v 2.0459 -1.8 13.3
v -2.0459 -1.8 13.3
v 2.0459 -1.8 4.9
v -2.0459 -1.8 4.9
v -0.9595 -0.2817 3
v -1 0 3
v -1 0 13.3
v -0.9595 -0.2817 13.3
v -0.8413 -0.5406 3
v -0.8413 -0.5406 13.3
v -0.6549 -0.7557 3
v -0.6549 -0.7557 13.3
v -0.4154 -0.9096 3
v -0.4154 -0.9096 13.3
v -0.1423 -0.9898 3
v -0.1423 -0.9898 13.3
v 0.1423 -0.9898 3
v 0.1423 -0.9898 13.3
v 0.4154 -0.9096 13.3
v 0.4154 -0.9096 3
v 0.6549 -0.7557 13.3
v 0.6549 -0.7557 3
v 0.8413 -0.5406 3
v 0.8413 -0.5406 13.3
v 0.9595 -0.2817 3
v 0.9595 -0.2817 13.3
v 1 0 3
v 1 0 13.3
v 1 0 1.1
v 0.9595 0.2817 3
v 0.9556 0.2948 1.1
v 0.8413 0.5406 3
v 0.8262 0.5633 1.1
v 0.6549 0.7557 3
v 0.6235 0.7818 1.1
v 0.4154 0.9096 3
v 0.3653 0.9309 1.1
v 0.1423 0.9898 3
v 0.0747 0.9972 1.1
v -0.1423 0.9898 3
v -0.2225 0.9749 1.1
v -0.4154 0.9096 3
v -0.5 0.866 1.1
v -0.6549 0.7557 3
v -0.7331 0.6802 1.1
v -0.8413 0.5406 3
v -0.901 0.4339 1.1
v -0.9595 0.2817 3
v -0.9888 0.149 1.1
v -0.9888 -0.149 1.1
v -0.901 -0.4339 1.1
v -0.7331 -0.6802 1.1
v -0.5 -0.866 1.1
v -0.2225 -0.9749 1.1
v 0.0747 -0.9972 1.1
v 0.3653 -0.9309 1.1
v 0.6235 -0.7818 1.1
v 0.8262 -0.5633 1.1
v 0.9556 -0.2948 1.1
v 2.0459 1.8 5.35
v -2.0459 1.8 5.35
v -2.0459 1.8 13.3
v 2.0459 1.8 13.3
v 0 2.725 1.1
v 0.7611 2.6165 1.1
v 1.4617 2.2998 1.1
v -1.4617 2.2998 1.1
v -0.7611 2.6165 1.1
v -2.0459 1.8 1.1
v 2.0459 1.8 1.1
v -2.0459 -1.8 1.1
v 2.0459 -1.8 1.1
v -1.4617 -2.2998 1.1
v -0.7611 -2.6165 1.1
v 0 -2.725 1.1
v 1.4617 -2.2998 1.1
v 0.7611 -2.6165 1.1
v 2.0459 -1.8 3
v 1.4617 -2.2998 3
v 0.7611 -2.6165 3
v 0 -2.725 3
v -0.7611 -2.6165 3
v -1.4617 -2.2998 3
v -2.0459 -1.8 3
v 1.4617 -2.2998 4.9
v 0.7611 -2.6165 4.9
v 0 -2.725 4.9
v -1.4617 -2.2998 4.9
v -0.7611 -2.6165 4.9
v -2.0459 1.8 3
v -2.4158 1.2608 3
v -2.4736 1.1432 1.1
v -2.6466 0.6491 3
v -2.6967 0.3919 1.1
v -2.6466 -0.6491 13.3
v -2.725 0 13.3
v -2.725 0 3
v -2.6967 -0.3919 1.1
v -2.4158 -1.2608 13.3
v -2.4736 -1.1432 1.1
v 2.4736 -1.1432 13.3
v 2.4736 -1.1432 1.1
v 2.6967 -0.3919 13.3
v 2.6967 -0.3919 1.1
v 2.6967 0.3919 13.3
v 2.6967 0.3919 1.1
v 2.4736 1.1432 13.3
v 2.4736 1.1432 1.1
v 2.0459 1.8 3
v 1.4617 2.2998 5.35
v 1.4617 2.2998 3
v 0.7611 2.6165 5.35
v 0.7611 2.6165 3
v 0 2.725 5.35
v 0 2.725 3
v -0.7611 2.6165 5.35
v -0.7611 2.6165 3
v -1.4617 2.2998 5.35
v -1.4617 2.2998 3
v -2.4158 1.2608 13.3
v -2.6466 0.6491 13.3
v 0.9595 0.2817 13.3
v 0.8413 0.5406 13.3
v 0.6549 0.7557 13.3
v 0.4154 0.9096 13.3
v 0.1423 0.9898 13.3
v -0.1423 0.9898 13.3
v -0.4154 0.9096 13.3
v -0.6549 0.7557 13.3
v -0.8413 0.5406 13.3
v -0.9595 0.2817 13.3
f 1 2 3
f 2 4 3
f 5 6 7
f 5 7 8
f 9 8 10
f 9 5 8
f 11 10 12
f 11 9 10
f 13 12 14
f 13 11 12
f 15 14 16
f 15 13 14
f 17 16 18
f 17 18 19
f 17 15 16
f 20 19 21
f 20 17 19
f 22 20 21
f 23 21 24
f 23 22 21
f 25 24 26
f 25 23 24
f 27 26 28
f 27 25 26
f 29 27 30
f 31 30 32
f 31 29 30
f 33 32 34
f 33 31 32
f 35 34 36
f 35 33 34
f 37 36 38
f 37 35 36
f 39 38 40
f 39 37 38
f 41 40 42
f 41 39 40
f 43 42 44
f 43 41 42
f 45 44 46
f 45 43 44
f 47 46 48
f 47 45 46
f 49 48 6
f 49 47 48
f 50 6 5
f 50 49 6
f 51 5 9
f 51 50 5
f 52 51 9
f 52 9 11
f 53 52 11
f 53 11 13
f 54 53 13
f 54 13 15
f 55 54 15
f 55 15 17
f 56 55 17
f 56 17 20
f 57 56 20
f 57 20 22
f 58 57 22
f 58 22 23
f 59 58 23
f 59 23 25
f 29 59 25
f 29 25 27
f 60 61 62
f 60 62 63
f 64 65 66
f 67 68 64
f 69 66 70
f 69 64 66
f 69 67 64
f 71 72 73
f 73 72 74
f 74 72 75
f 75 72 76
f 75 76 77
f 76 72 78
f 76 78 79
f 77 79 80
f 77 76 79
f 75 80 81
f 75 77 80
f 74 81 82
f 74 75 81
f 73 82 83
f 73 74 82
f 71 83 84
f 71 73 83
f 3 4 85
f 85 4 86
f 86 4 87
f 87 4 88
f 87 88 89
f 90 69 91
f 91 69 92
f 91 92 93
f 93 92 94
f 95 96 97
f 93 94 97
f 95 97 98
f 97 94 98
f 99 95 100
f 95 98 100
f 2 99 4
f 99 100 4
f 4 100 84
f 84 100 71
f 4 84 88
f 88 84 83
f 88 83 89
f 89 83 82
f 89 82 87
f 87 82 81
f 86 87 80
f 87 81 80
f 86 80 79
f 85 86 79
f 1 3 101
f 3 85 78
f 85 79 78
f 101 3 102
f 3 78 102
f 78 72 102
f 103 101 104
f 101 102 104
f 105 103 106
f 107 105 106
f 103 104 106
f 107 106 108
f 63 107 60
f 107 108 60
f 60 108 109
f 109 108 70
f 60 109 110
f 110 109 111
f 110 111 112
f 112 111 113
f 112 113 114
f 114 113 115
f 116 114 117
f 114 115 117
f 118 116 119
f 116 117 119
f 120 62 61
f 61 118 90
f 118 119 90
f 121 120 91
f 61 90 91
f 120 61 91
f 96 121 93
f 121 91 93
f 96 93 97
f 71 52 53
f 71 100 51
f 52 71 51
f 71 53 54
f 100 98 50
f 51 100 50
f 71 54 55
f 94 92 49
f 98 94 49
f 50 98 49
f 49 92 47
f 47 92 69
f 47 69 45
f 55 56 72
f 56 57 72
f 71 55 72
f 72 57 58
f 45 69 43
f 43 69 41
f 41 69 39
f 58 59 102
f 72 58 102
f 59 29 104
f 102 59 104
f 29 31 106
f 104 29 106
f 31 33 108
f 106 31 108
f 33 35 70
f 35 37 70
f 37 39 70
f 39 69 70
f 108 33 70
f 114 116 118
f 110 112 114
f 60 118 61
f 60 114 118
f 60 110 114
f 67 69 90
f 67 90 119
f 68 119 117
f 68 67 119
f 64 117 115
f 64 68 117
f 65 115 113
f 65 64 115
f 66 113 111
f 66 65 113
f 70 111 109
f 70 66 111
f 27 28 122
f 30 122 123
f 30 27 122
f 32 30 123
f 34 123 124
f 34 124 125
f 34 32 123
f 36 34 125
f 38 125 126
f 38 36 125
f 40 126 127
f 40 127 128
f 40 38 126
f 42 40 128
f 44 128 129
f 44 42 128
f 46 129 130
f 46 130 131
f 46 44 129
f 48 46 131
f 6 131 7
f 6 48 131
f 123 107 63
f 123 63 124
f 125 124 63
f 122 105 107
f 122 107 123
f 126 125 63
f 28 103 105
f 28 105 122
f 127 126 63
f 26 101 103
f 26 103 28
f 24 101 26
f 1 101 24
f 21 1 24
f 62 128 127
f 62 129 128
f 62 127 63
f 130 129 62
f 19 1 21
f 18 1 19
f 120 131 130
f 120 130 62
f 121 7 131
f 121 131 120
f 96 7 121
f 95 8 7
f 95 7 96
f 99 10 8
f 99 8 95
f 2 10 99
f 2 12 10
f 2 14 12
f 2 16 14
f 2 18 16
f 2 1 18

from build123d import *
from build123d.topology import SkipClean

# Parameters (mm, degrees)
SKETCH1_R           = 1
BOSS_EXTRUDE1_DEPTH = 3
BOSS_EXTRUDE2_START = 0.5
SKETCH2_R           = 1.75
SKETCH2_R_2         = 1
BOSS_EXTRUDE2_DEPTH = 0.5
SKETCH3_R           = 2.725
SKETCH3_R_2         = 1
BOSS_EXTRUDE3_DEPTH = 10.3
CUT_EXTRUDE1_START  = -7.95
CUT_EXTRUDE1_DEPTH  = 7.95
CUT_EXTRUDE3_DEPTH  = 3.5
CUT_EXTRUDE4_START  = -8.4
CUT_EXTRUDE4_DEPTH  = 8.4
BOSS_EXTRUDE4_START = -12.2
SKETCH9_R           = 1
BOSS_EXTRUDE4_DEPTH = 12.2
BOSS_EXTRUDE5_START = 1.9
BOSS_EXTRUDE5_DEPTH = 1.9


with BuildPart() as part:
    # Sketch1 → Boss-Extrude1 (new body)
    with BuildSketch(Plane.XY):
        with BuildLine():
            Line((1.642723432, 9.052152215), (1.930369102, 8.457499638))
            Line((1.930369102, 8.457499638), (1.813545612, 7.945662484))
            ThreePointArc((1.813545612, 7.945662484), (1.99137431, 7.902969591), (2.168200291, 7.856297315))
            ThreePointArc((2.168200291, 7.856297315), (2.343934519, 7.805669156), (2.518488504, 7.751110608))
            Line((2.518488504, 7.751110608), (2.680722426, 8.250415279))
            Line((2.680722426, 8.250415279), (3.232648382, 8.61336081))
            Line((3.232648382, 8.61336081), (3.409492149, 7.976903427))
            Line((3.409492149, 7.976903427), (3.203154008, 7.494151346))
            ThreePointArc((3.203154008, 7.494151346), (3.370501815, 7.420392005), (3.536152474, 7.342896273))
            ThreePointArc((3.536152474, 7.342896273), (3.700022573, 7.261703172), (3.862029599, 7.176853585))
            Line((3.862029599, 7.176853585), (4.110810647, 7.639166239))
            Line((4.110810647, 7.639166239), (4.718673352, 7.897728901))
            Line((4.718673352, 7.897728901), (4.779031314, 7.239922976))
            Line((4.779031314, 7.239922976), (4.489810399, 6.801772018))
            ThreePointArc((4.489810399, 6.801772018), (4.641298619, 6.699316915), (4.790449806, 6.593488504))
            ThreePointArc((4.790449806, 6.593488504), (4.937188857, 6.484340073), (5.081441885, 6.371926582))
            Line((5.081441885, 6.371926582), (5.408774031, 6.78238811))
            Line((5.408774031, 6.78238811), (6.053036279, 6.928257487))
            Line((6.053036279, 6.928257487), (5.99496848, 6.270245444))
            Line((5.99496848, 6.270245444), (5.632160589, 5.89077814))
            ThreePointArc((5.632160589, 5.89077814), (5.762920267, 5.762920267), (5.89077814, 5.632160589))
            ThreePointArc((5.89077814, 5.632160589), (6.01566983, 5.498564949), (6.137532448, 5.362200616))
            Line((6.137532448, 5.362200616), (6.532894968, 5.707618447))
            Line((6.532894968, 5.707618447), (7.192849639, 5.736106177))
            Line((7.192849639, 5.736106177), (7.018222426, 5.099037064))
            Line((7.018222426, 5.099037064), (6.593488504, 4.790449806))
            ThreePointArc((6.593488504, 4.790449806), (6.699316915, 4.641298619), (6.801772018, 4.489810399))
            ThreePointArc((6.801772018, 4.489810399), (6.900802224, 4.336061424), (6.996357668, 4.180129111))
            Line((6.996357668, 4.180129111), (7.447043285, 4.449401231))
            Line((7.447043285, 4.449401231), (8.101478893, 4.359591695))
            Line((8.101478893, 4.359591695), (7.815904929, 3.763941437))
            Line((7.815904929, 3.763941437), (7.342896273, 3.536152474))
            ThreePointArc((7.342896273, 3.536152474), (7.420392005, 3.370501816), (7.494151346, 3.203154008))
            ThreePointArc((7.494151346, 3.203154008), (7.564137156, 3.034193316), (7.630314196, 2.863704816))
            Line((7.630314196, 2.863704816), (8.121837503, 3.048176599))
            Line((8.121837503, 3.048176599), (8.74971995, 2.842956348))
            Line((8.74971995, 2.842956348), (8.362377816, 2.307869635))
            Line((8.362377816, 2.307869635), (7.856297315, 2.168200292))
            ThreePointArc((7.856297315, 2.168200292), (7.902969591, 1.99137431), (7.945662484, 1.813545612))
            ThreePointArc((7.945662484, 1.813545612), (7.984354497, 1.634803739), (8.019026147, 1.455238692))
            Line((8.019026147, 1.455238692), (8.535589181, 1.548981062))
            Line((8.535589181, 1.548981062), (9.116737808, 1.234946046))
            Line((9.116737808, 1.234946046), (8.640077, 0.777621005))
            Line((8.640077, 0.777621005), (8.117190496, 0.730560368))
            ThreePointArc((8.117190496, 0.730560368), (8.131539232, 0.548242396), (8.141793492, 0.365648367))
            ThreePointArc((8.141793492, 0.365648367), (8.147948115, 0.182870224), (8.15, 0))
            Line((8.15, 0), (8.675, 0))
            Line((8.675, 0), (9.190736212, -0.412756439))
            Line((9.190736212, -0.412756439), (8.640077, -0.777621005))
            Line((8.640077, -0.777621005), (8.117190496, -0.730560367))
            ThreePointArc((8.117190496, -0.730560367), (8.098754511, -0.91251048), (8.076240558, -1.094001116))
            ThreePointArc((8.076240558, -1.094001116), (8.049659976, -1.27494089), (8.019026147, -1.455238693))
            Line((8.019026147, -1.455238693), (8.535589181, -1.548981063))
            Line((8.535589181, -1.548981063), (8.969336792, -2.047192592))
            Line((8.969336792, -2.047192592), (8.362377817, -2.307869635))
            Line((8.362377817, -2.307869635), (7.856297315, -2.168200291))
            ThreePointArc((7.856297315, -2.168200291), (7.805669156, -2.343934518), (7.751110608, -2.518488504))
            ThreePointArc((7.751110608, -2.518488504), (7.692649142, -2.691774355), (7.630314196, -2.863704816))
            Line((7.630314196, -2.863704816), (8.121837503, -3.048176599))
            Line((8.121837503, -3.048176599), (8.459655507, -3.615830291))
            Line((8.459655507, -3.615830291), (7.815904929, -3.763941437))
            Line((7.815904929, -3.763941437), (7.342896273, -3.536152474))
            ThreePointArc((7.342896273, -3.536152474), (7.261703172, -3.700022573), (7.176853585, -3.862029599))
            ThreePointArc((7.176853585, -3.862029599), (7.088390235, -4.022091977), (6.996357668, -4.180129111))
            Line((6.996357668, -4.180129111), (7.447043284, -4.449401232))
            Line((7.447043284, -4.449401232), (7.678073934, -5.068252229))
            Line((7.678073934, -5.068252229), (7.018222426, -5.099037063))
            Line((7.018222426, -5.099037063), (6.593488504, -4.790449806))
            ThreePointArc((6.593488504, -4.790449806), (6.484340073, -4.937188857), (6.371926582, -5.081441885))
            ThreePointArc((6.371926582, -5.081441885), (6.256304634, -5.223136254), (6.137532448, -5.362200617))
            Line((6.137532448, -5.362200617), (6.532894967, -5.707618448))
            Line((6.532894967, -5.707618448), (6.649712747, -6.357776371))
            Line((6.649712747, -6.357776371), (5.99496848, -6.270245444))
            Line((5.99496848, -6.270245444), (5.632160589, -5.89077814))
            ThreePointArc((5.632160589, -5.89077814), (5.498564949, -6.015669829), (5.362200616, -6.137532448))
            ThreePointArc((5.362200616, -6.137532448), (5.223136254, -6.256304634), (5.081441885, -6.371926582))
            Line((5.081441885, -6.371926582), (5.408774031, -6.782388111))
            Line((5.408774031, -6.782388111), (5.407624321, -7.442956348))
            Line((5.407624321, -7.442956348), (4.779031314, -7.239922976))
            Line((4.779031314, -7.239922976), (4.489810399, -6.801772018))
            ThreePointArc((4.489810399, -6.801772018), (4.336061424, -6.900802224), (4.180129111, -6.996357668))
            ThreePointArc((4.180129111, -6.996357668), (4.022091977, -7.088390235), (3.862029599, -7.176853585))
            Line((3.862029599, -7.176853585), (4.110810647, -7.639166239))
            Line((4.110810647, -7.639166239), (3.9917304, -8.288913585))
            Line((3.9917304, -8.288913585), (3.40949215, -7.976903427))
            Line((3.40949215, -7.976903427), (3.203154008, -7.494151346))
            ThreePointArc((3.203154008, -7.494151346), (3.034193316, -7.564137156), (2.863704816, -7.630314196))
            ThreePointArc((2.863704816, -7.630314196), (2.691774355, -7.692649142), (2.518488504, -7.751110608))
            Line((2.518488504, -7.751110608), (2.680722426, -8.250415279))
            Line((2.680722426, -8.250415279), (2.447538979, -8.868458318))
            Line((2.447538979, -8.868458318), (1.930369102, -8.457499638))
            Line((1.930369102, -8.457499638), (1.813545612, -7.945662484))
            ThreePointArc((1.813545612, -7.945662484), (1.634803739, -7.984354497), (1.455238693, -8.019026147))
            ThreePointArc((1.455238693, -8.019026147), (1.27494089, -8.049659976), (1.094001116, -8.076240558))
            Line((1.094001116, -8.076240558), (1.164473581, -8.596489183))
            Line((1.164473581, -8.596489183), (0.824681642, -9.162963505))
            Line((0.824681642, -9.162963505), (0.389202404, -8.666264852))
            Line((0.389202404, -8.666264852), (0.365648368, -8.141793492))
            ThreePointArc((0.365648368, -8.141793492), (0.182870224, -8.147948115), (0, -8.15))
            ThreePointArc((0, -8.15), (-0.182870224, -8.147948115), (-0.365648368, -8.141793492))
            Line((-0.365648368, -8.141793492), (-0.389202404, -8.666264852))
            Line((-0.389202404, -8.666264852), (-0.824681642, -9.162963505))
            Line((-0.824681642, -9.162963505), (-1.164473581, -8.596489183))
            Line((-1.164473581, -8.596489183), (-1.094001116, -8.076240558))
            ThreePointArc((-1.094001116, -8.076240558), (-1.27494089, -8.049659976), (-1.455238693, -8.019026147))
            ThreePointArc((-1.455238693, -8.019026147), (-1.634803739, -7.984354497), (-1.813545612, -7.945662484))
            Line((-1.813545612, -7.945662484), (-1.930369102, -8.457499638))
            Line((-1.930369102, -8.457499638), (-2.447538979, -8.868458318))
            Line((-2.447538979, -8.868458318), (-2.680722426, -8.250415279))
            Line((-2.680722426, -8.250415279), (-2.518488504, -7.751110608))
            ThreePointArc((-2.518488504, -7.751110608), (-2.691774355, -7.692649142), (-2.863704816, -7.630314196))
            ThreePointArc((-2.863704816, -7.630314196), (-3.034193316, -7.564137156), (-3.203154008, -7.494151346))
            Line((-3.203154008, -7.494151346), (-3.40949215, -7.976903427))
            Line((-3.40949215, -7.976903427), (-3.9917304, -8.288913585))
            Line((-3.9917304, -8.288913585), (-4.110810647, -7.639166239))
            Line((-4.110810647, -7.639166239), (-3.862029599, -7.176853585))
            ThreePointArc((-3.862029599, -7.176853585), (-4.022091977, -7.088390235), (-4.180129111, -6.996357668))
            ThreePointArc((-4.180129111, -6.996357668), (-4.336061424, -6.900802224), (-4.489810399, -6.801772018))
            Line((-4.489810399, -6.801772018), (-4.779031314, -7.239922976))
            Line((-4.779031314, -7.239922976), (-5.407624321, -7.442956348))
            Line((-5.407624321, -7.442956348), (-5.408774031, -6.782388111))
            Line((-5.408774031, -6.782388111), (-5.081441885, -6.371926582))
            ThreePointArc((-5.081441885, -6.371926582), (-5.223136254, -6.256304634), (-5.362200616, -6.137532448))
            ThreePointArc((-5.362200616, -6.137532448), (-5.498564949, -6.015669829), (-5.632160589, -5.89077814))
            Line((-5.632160589, -5.89077814), (-5.99496848, -6.270245444))
            Line((-5.99496848, -6.270245444), (-6.649712747, -6.357776371))
            Line((-6.649712747, -6.357776371), (-6.532894967, -5.707618448))
            Line((-6.532894967, -5.707618448), (-6.137532448, -5.362200617))
            ThreePointArc((-6.137532448, -5.362200617), (-6.256304634, -5.223136254), (-6.371926582, -5.081441885))
            ThreePointArc((-6.371926582, -5.081441885), (-6.484340073, -4.937188857), (-6.593488504, -4.790449806))
            Line((-6.593488504, -4.790449806), (-7.018222426, -5.099037063))
            Line((-7.018222426, -5.099037063), (-7.678073934, -5.068252229))
            Line((-7.678073934, -5.068252229), (-7.447043284, -4.449401232))
            Line((-7.447043284, -4.449401232), (-6.996357668, -4.180129111))
            ThreePointArc((-6.996357668, -4.180129111), (-7.088390235, -4.022091977), (-7.176853585, -3.862029599))
            ThreePointArc((-7.176853585, -3.862029599), (-7.261703172, -3.700022573), (-7.342896273, -3.536152474))
            Line((-7.342896273, -3.536152474), (-7.815904929, -3.763941437))
            Line((-7.815904929, -3.763941437), (-8.459655507, -3.615830291))
            Line((-8.459655507, -3.615830291), (-8.121837503, -3.048176599))
            Line((-8.121837503, -3.048176599), (-7.630314196, -2.863704816))
            ThreePointArc((-7.630314196, -2.863704816), (-7.692649142, -2.691774355), (-7.751110608, -2.518488504))
            ThreePointArc((-7.751110608, -2.518488504), (-7.805669156, -2.343934518), (-7.856297315, -2.168200291))
            Line((-7.856297315, -2.168200291), (-8.362377817, -2.307869635))
            Line((-8.362377817, -2.307869635), (-8.969336792, -2.047192592))
            Line((-8.969336792, -2.047192592), (-8.535589181, -1.548981063))
            Line((-8.535589181, -1.548981063), (-8.019026147, -1.455238693))
            ThreePointArc((-8.019026147, -1.455238693), (-8.049659976, -1.27494089), (-8.076240558, -1.094001116))
            ThreePointArc((-8.076240558, -1.094001116), (-8.098754511, -0.91251048), (-8.117190496, -0.730560367))
            Line((-8.117190496, -0.730560367), (-8.640077, -0.777621005))
            Line((-8.640077, -0.777621005), (-9.190736212, -0.412756439))
            Line((-9.190736212, -0.412756439), (-8.675, 0))
            Line((-8.675, 0), (-8.15, 0))
            ThreePointArc((-8.15, 0), (-8.147948115, 0.182870224), (-8.141793492, 0.365648367))
            ThreePointArc((-8.141793492, 0.365648367), (-8.131539232, 0.548242396), (-8.117190496, 0.730560368))
            Line((-8.117190496, 0.730560368), (-8.640077, 0.777621005))
            Line((-8.640077, 0.777621005), (-9.116737808, 1.234946046))
            Line((-9.116737808, 1.234946046), (-8.535589181, 1.548981062))
            Line((-8.535589181, 1.548981062), (-8.019026147, 1.455238692))
            ThreePointArc((-8.019026147, 1.455238692), (-7.984354497, 1.634803739), (-7.945662484, 1.813545612))
            ThreePointArc((-7.945662484, 1.813545612), (-7.902969591, 1.99137431), (-7.856297315, 2.168200292))
            Line((-7.856297315, 2.168200292), (-8.362377816, 2.307869635))
            Line((-8.362377816, 2.307869635), (-8.74971995, 2.842956348))
            Line((-8.74971995, 2.842956348), (-8.121837503, 3.048176599))
            Line((-8.121837503, 3.048176599), (-7.630314196, 2.863704816))
            ThreePointArc((-7.630314196, 2.863704816), (-7.564137156, 3.034193316), (-7.494151346, 3.203154008))
            ThreePointArc((-7.494151346, 3.203154008), (-7.420392005, 3.370501816), (-7.342896273, 3.536152474))
            Line((-7.342896273, 3.536152474), (-7.815904929, 3.763941437))
            Line((-7.815904929, 3.763941437), (-8.101478893, 4.359591695))
            Line((-8.101478893, 4.359591695), (-7.447043285, 4.449401231))
            Line((-7.447043285, 4.449401231), (-6.996357668, 4.180129111))
            ThreePointArc((-6.996357668, 4.180129111), (-6.900802224, 4.336061424), (-6.801772018, 4.489810399))
            ThreePointArc((-6.801772018, 4.489810399), (-6.699316915, 4.641298619), (-6.593488504, 4.790449806))
            Line((-6.593488504, 4.790449806), (-7.018222426, 5.099037064))
            Line((-7.018222426, 5.099037064), (-7.192849639, 5.736106177))
            Line((-7.192849639, 5.736106177), (-6.532894968, 5.707618447))
            Line((-6.532894968, 5.707618447), (-6.137532448, 5.362200616))
            ThreePointArc((-6.137532448, 5.362200616), (-6.01566983, 5.498564949), (-5.89077814, 5.632160589))
            ThreePointArc((-5.89077814, 5.632160589), (-5.762920267, 5.762920267), (-5.632160589, 5.89077814))
            Line((-5.632160589, 5.89077814), (-5.99496848, 6.270245444))
            Line((-5.99496848, 6.270245444), (-6.053036279, 6.928257487))
            Line((-6.053036279, 6.928257487), (-5.408774031, 6.78238811))
            Line((-5.408774031, 6.78238811), (-5.081441885, 6.371926582))
            ThreePointArc((-5.081441885, 6.371926582), (-4.937188857, 6.484340073), (-4.790449806, 6.593488504))
            ThreePointArc((-4.790449806, 6.593488504), (-4.641298619, 6.699316915), (-4.489810399, 6.801772018))
            Line((-4.489810399, 6.801772018), (-4.779031314, 7.239922976))
            Line((-4.779031314, 7.239922976), (-4.718673352, 7.897728901))
            Line((-4.718673352, 7.897728901), (-4.110810647, 7.639166239))
            Line((-4.110810647, 7.639166239), (-3.862029599, 7.176853585))
            ThreePointArc((-3.862029599, 7.176853585), (-3.700022573, 7.261703172), (-3.536152474, 7.342896273))
            ThreePointArc((-3.536152474, 7.342896273), (-3.370501815, 7.420392005), (-3.203154008, 7.494151346))
            Line((-3.203154008, 7.494151346), (-3.409492149, 7.976903427))
            Line((-3.409492149, 7.976903427), (-3.232648382, 8.61336081))
            Line((-3.232648382, 8.61336081), (-2.680722426, 8.250415279))
            Line((-2.680722426, 8.250415279), (-2.518488504, 7.751110608))
            ThreePointArc((-2.518488504, 7.751110608), (-2.343934519, 7.805669156), (-2.168200291, 7.856297315))
            ThreePointArc((-2.168200291, 7.856297315), (-1.99137431, 7.902969591), (-1.813545612, 7.945662484))
            Line((-1.813545612, 7.945662484), (-1.930369102, 8.457499638))
            Line((-1.930369102, 8.457499638), (-1.642723432, 9.052152215))
            Line((-1.642723432, 9.052152215), (-1.164473581, 8.596489183))
            Line((-1.164473581, 8.596489183), (-1.094001117, 8.076240558))
            ThreePointArc((-1.094001117, 8.076240558), (-0.91251048, 8.098754511), (-0.730560368, 8.117190496))
            ThreePointArc((-0.730560368, 8.117190496), (-0.548242396, 8.131539232), (-0.365648367, 8.141793492))
            Line((-0.365648367, 8.141793492), (-0.389202403, 8.666264852))
            Line((-0.389202403, 8.666264852), (0, 9.2))
            Line((0, 9.2), (0.389202403, 8.666264852))
            Line((0.389202403, 8.666264852), (0.365648367, 8.141793492))
            ThreePointArc((0.365648367, 8.141793492), (0.548242396, 8.131539232), (0.730560368, 8.117190496))
            ThreePointArc((0.730560368, 8.117190496), (0.91251048, 8.098754511), (1.094001117, 8.076240558))
            Line((1.094001117, 8.076240558), (1.164473581, 8.596489183))
            Line((1.164473581, 8.596489183), (1.642723432, 9.052152215))
        make_face()
        Circle(SKETCH1_R, mode=Mode.SUBTRACT)
    extrude(amount=BOSS_EXTRUDE1_DEPTH)

    # Sketch2 → Boss-Extrude2 (add)
    with SkipClean():  # the faces are left unmerged after this step: merging them gives an invalid solid
        with BuildSketch(Plane(origin=(0, 0, 0), x_dir=(-1, 0, 0), z_dir=(0, 0, -1)).offset(BOSS_EXTRUDE2_START)):
            with Locations(Location((0, 0, 0), (0, 0, 180))):
                Circle(SKETCH2_R)
            Circle(SKETCH2_R_2, mode=Mode.SUBTRACT)
        extrude(amount=-BOSS_EXTRUDE2_DEPTH)

    # Sketch3 → Boss-Extrude3 (add)
    with BuildSketch(Plane.XY.offset(3)):
        with Locations(Location((0, 0, 0), (0, 0, 180))):
            Circle(SKETCH3_R)
        with Locations(Location((0, 0, 0), (0, 0, 180))):
            Circle(SKETCH3_R_2, mode=Mode.SUBTRACT)
    extrude(amount=BOSS_EXTRUDE3_DEPTH)

    # Sketch4 → Cut-Extrude1 (cut)
    with BuildSketch(Plane.XY.offset(13.3).offset(CUT_EXTRUDE1_START)):
        with BuildLine():
            Line((-2.045880006, -1.8), (2.045880006, -1.8))
            ThreePointArc((2.045880006, -1.8), (0, -2.725), (-2.045880006, -1.8))
        make_face()
        with BuildLine():
            Line((-2.045880006, 1.8), (2.045880006, 1.8))
            ThreePointArc((2.045880006, 1.8), (0, 2.725), (-2.045880006, 1.8))
        make_face()
    extrude(amount=CUT_EXTRUDE1_DEPTH, mode=Mode.SUBTRACT)

    # Sketch6 → Cut-Extrude3 (cut)
    with BuildSketch(Plane(origin=(0, 0, -0.5), x_dir=(-1, 0, 0), z_dir=(0, 0, -1))):
        with BuildLine():
            Line((0.365648367, 8.141793492), (0.389202403, 8.666264852))
            Line((0.389202403, 8.666264852), (0, 9.2))
            Line((0, 9.2), (-0.389202403, 8.666264852))
            Line((-0.389202403, 8.666264852), (-0.365648367, 8.141793492))
            ThreePointArc((-0.365648367, 8.141793492), (-0.730560368, 8.117190496), (-1.094001117, 8.076240558))
            Line((-1.094001117, 8.076240558), (-1.164473581, 8.596489183))
            Line((-1.164473581, 8.596489183), (-1.642723432, 9.052152215))
            Line((-1.642723432, 9.052152215), (-1.930369102, 8.457499638))
            Line((-1.930369102, 8.457499638), (-1.813545612, 7.945662484))
            ThreePointArc((-1.813545612, 7.945662484), (-2.168200291, 7.856297315), (-2.518488504, 7.751110608))
            Line((-2.518488504, 7.751110608), (-2.680722426, 8.250415279))
            Line((-2.680722426, 8.250415279), (-3.232648382, 8.61336081))
            Line((-3.232648382, 8.61336081), (-3.409492149, 7.976903427))
            Line((-3.409492149, 7.976903427), (-3.203154008, 7.494151346))
            ThreePointArc((-3.203154008, 7.494151346), (-3.536152474, 7.342896273), (-3.862029599, 7.176853585))
            Line((-3.862029599, 7.176853585), (-4.110810647, 7.639166239))
            Line((-4.110810647, 7.639166239), (-4.718673352, 7.897728901))
            Line((-4.718673352, 7.897728901), (-4.779031314, 7.239922976))
            Line((-4.779031314, 7.239922976), (-4.489810399, 6.801772018))
            ThreePointArc((-4.489810399, 6.801772018), (-4.790449806, 6.593488504), (-5.081441885, 6.371926582))
            Line((-5.081441885, 6.371926582), (-5.408774031, 6.78238811))
            Line((-5.408774031, 6.78238811), (-6.053036279, 6.928257487))
            Line((-6.053036279, 6.928257487), (-5.99496848, 6.270245444))
            Line((-5.99496848, 6.270245444), (-5.632160589, 5.89077814))
            ThreePointArc((-5.632160589, 5.89077814), (-5.89077814, 5.632160589), (-6.137532448, 5.362200616))
            Line((-6.137532448, 5.362200616), (-6.532894968, 5.707618447))
            Line((-6.532894968, 5.707618447), (-7.192849639, 5.736106177))
            Line((-7.192849639, 5.736106177), (-7.018222426, 5.099037064))
            Line((-7.018222426, 5.099037064), (-6.593488504, 4.790449806))
            ThreePointArc((-6.593488504, 4.790449806), (-6.801772018, 4.489810399), (-6.996357668, 4.180129111))
            Line((-6.996357668, 4.180129111), (-7.447043285, 4.449401231))
            Line((-7.447043285, 4.449401231), (-8.101478893, 4.359591695))
            Line((-8.101478893, 4.359591695), (-7.815904929, 3.763941437))
            Line((-7.815904929, 3.763941437), (-7.342896273, 3.536152474))
            ThreePointArc((-7.342896273, 3.536152474), (-7.494151346, 3.203154008), (-7.630314196, 2.863704816))
            Line((-7.630314196, 2.863704816), (-8.121837503, 3.048176599))
            Line((-8.121837503, 3.048176599), (-8.74971995, 2.842956348))
            Line((-8.74971995, 2.842956348), (-8.362377816, 2.307869635))
            Line((-8.362377816, 2.307869635), (-7.856297315, 2.168200292))
            ThreePointArc((-7.856297315, 2.168200292), (-7.945662484, 1.813545612), (-8.019026147, 1.455238692))
            Line((-8.019026147, 1.455238692), (-8.535589181, 1.548981062))
            Line((-8.535589181, 1.548981062), (-9.116737808, 1.234946046))
            Line((-9.116737808, 1.234946046), (-8.640077, 0.777621005))
            Line((-8.640077, 0.777621005), (-8.117190496, 0.730560368))
            ThreePointArc((-8.117190496, 0.730560368), (-8.141793492, 0.365648367), (-8.15, 0))
            Line((-8.15, 0), (-8.675, 0))
            Line((-8.675, 0), (-9.190736212, -0.412756439))
            Line((-9.190736212, -0.412756439), (-8.640077, -0.777621005))
            Line((-8.640077, -0.777621005), (-8.117190496, -0.730560367))
            ThreePointArc((-8.117190496, -0.730560367), (-8.076240558, -1.094001116), (-8.019026147, -1.455238693))
            Line((-8.019026147, -1.455238693), (-8.535589181, -1.548981063))
            Line((-8.535589181, -1.548981063), (-8.969336792, -2.047192592))
            Line((-8.969336792, -2.047192592), (-8.362377817, -2.307869635))
            Line((-8.362377817, -2.307869635), (-7.856297315, -2.168200291))
            ThreePointArc((-7.856297315, -2.168200291), (-7.751110608, -2.518488504), (-7.630314196, -2.863704816))
            Line((-7.630314196, -2.863704816), (-8.121837503, -3.048176599))
            Line((-8.121837503, -3.048176599), (-8.459655507, -3.615830291))
            Line((-8.459655507, -3.615830291), (-7.815904929, -3.763941437))
            Line((-7.815904929, -3.763941437), (-7.342896273, -3.536152474))
            ThreePointArc((-7.342896273, -3.536152474), (-7.176853585, -3.862029599), (-6.996357668, -4.180129111))
            Line((-6.996357668, -4.180129111), (-7.447043284, -4.449401232))
            Line((-7.447043284, -4.449401232), (-7.678073934, -5.068252229))
            Line((-7.678073934, -5.068252229), (-7.018222426, -5.099037063))
            Line((-7.018222426, -5.099037063), (-6.593488504, -4.790449806))
            ThreePointArc((-6.593488504, -4.790449806), (-6.371926582, -5.081441885), (-6.137532448, -5.362200617))
            Line((-6.137532448, -5.362200617), (-6.532894967, -5.707618448))
            Line((-6.532894967, -5.707618448), (-6.649712747, -6.357776371))
            Line((-6.649712747, -6.357776371), (-5.99496848, -6.270245444))
            Line((-5.99496848, -6.270245444), (-5.632160589, -5.89077814))
            ThreePointArc((-5.632160589, -5.89077814), (-5.362200616, -6.137532448), (-5.081441885, -6.371926582))
            Line((-5.081441885, -6.371926582), (-5.408774031, -6.782388111))
            Line((-5.408774031, -6.782388111), (-5.407624321, -7.442956348))
            Line((-5.407624321, -7.442956348), (-4.779031314, -7.239922976))
            Line((-4.779031314, -7.239922976), (-4.489810399, -6.801772018))
            ThreePointArc((-4.489810399, -6.801772018), (-4.180129111, -6.996357668), (-3.862029599, -7.176853585))
            Line((-3.862029599, -7.176853585), (-4.110810647, -7.639166239))
            Line((-4.110810647, -7.639166239), (-3.9917304, -8.288913585))
            Line((-3.9917304, -8.288913585), (-3.40949215, -7.976903427))
            Line((-3.40949215, -7.976903427), (-3.203154008, -7.494151346))
            ThreePointArc((-3.203154008, -7.494151346), (-2.863704816, -7.630314196), (-2.518488504, -7.751110608))
            Line((-2.518488504, -7.751110608), (-2.680722426, -8.250415279))
            Line((-2.680722426, -8.250415279), (-2.447538979, -8.868458318))
            Line((-2.447538979, -8.868458318), (-1.930369102, -8.457499638))
            Line((-1.930369102, -8.457499638), (-1.813545612, -7.945662484))
            ThreePointArc((-1.813545612, -7.945662484), (-1.455238693, -8.019026147), (-1.094001116, -8.076240558))
            Line((-1.094001116, -8.076240558), (-1.164473581, -8.596489183))
            Line((-1.164473581, -8.596489183), (-0.824681642, -9.162963505))
            Line((-0.824681642, -9.162963505), (-0.389202404, -8.666264852))
            Line((-0.389202404, -8.666264852), (-0.365648368, -8.141793492))
            ThreePointArc((-0.365648368, -8.141793492), (0, -8.15), (0.365648368, -8.141793492))
            Line((0.365648368, -8.141793492), (0.389202404, -8.666264852))
            Line((0.389202404, -8.666264852), (0.824681642, -9.162963505))
            Line((0.824681642, -9.162963505), (1.164473581, -8.596489183))
            Line((1.164473581, -8.596489183), (1.094001116, -8.076240558))
            ThreePointArc((1.094001116, -8.076240558), (1.455238693, -8.019026147), (1.813545612, -7.945662484))
            Line((1.813545612, -7.945662484), (1.930369102, -8.457499638))
            Line((1.930369102, -8.457499638), (2.447538979, -8.868458318))
            Line((2.447538979, -8.868458318), (2.680722426, -8.250415279))
            Line((2.680722426, -8.250415279), (2.518488504, -7.751110608))
            ThreePointArc((2.518488504, -7.751110608), (2.863704816, -7.630314196), (3.203154008, -7.494151346))
            Line((3.203154008, -7.494151346), (3.40949215, -7.976903427))
            Line((3.40949215, -7.976903427), (3.9917304, -8.288913585))
            Line((3.9917304, -8.288913585), (4.110810647, -7.639166239))
            Line((4.110810647, -7.639166239), (3.862029599, -7.176853585))
            ThreePointArc((3.862029599, -7.176853585), (4.180129111, -6.996357668), (4.489810399, -6.801772018))
            Line((4.489810399, -6.801772018), (4.779031314, -7.239922976))
            Line((4.779031314, -7.239922976), (5.407624321, -7.442956348))
            Line((5.407624321, -7.442956348), (5.408774031, -6.782388111))
            Line((5.408774031, -6.782388111), (5.081441885, -6.371926582))
            ThreePointArc((5.081441885, -6.371926582), (5.362200616, -6.137532448), (5.632160589, -5.89077814))
            Line((5.632160589, -5.89077814), (5.99496848, -6.270245444))
            Line((5.99496848, -6.270245444), (6.649712747, -6.357776371))
            Line((6.649712747, -6.357776371), (6.532894967, -5.707618448))
            Line((6.532894967, -5.707618448), (6.137532448, -5.362200617))
            ThreePointArc((6.137532448, -5.362200617), (6.371926582, -5.081441885), (6.593488504, -4.790449806))
            Line((6.593488504, -4.790449806), (7.018222426, -5.099037063))
            Line((7.018222426, -5.099037063), (7.678073934, -5.068252229))
            Line((7.678073934, -5.068252229), (7.447043284, -4.449401232))
            Line((7.447043284, -4.449401232), (6.996357668, -4.180129111))
            ThreePointArc((6.996357668, -4.180129111), (7.176853585, -3.862029599), (7.342896273, -3.536152474))
            Line((7.342896273, -3.536152474), (7.815904929, -3.763941437))
            Line((7.815904929, -3.763941437), (8.459655507, -3.615830291))
            Line((8.459655507, -3.615830291), (8.121837503, -3.048176599))
            Line((8.121837503, -3.048176599), (7.630314196, -2.863704816))
            ThreePointArc((7.630314196, -2.863704816), (7.751110608, -2.518488504), (7.856297315, -2.168200291))
            Line((7.856297315, -2.168200291), (8.362377817, -2.307869635))
            Line((8.362377817, -2.307869635), (8.969336792, -2.047192592))
            Line((8.969336792, -2.047192592), (8.535589181, -1.548981063))
            Line((8.535589181, -1.548981063), (8.019026147, -1.455238693))
            ThreePointArc((8.019026147, -1.455238693), (8.076240558, -1.094001116), (8.117190496, -0.730560367))
            Line((8.117190496, -0.730560367), (8.640077, -0.777621005))
            Line((8.640077, -0.777621005), (9.190736212, -0.412756439))
            Line((9.190736212, -0.412756439), (8.675, 0))
            Line((8.675, 0), (8.15, 0))
            ThreePointArc((8.15, 0), (8.141793492, 0.365648367), (8.117190496, 0.730560368))
            Line((8.117190496, 0.730560368), (8.640077, 0.777621005))
            Line((8.640077, 0.777621005), (9.116737808, 1.234946046))
            Line((9.116737808, 1.234946046), (8.535589181, 1.548981062))
            Line((8.535589181, 1.548981062), (8.019026147, 1.455238692))
            ThreePointArc((8.019026147, 1.455238692), (7.945662484, 1.813545612), (7.856297315, 2.168200292))
            Line((7.856297315, 2.168200292), (8.362377816, 2.307869635))
            Line((8.362377816, 2.307869635), (8.74971995, 2.842956348))
            Line((8.74971995, 2.842956348), (8.121837503, 3.048176599))
            Line((8.121837503, 3.048176599), (7.630314196, 2.863704816))
            ThreePointArc((7.630314196, 2.863704816), (7.494151346, 3.203154008), (7.342896273, 3.536152474))
            Line((7.342896273, 3.536152474), (7.815904929, 3.763941437))
            Line((7.815904929, 3.763941437), (8.101478893, 4.359591695))
            Line((8.101478893, 4.359591695), (7.447043285, 4.449401231))
            Line((7.447043285, 4.449401231), (6.996357668, 4.180129111))
            ThreePointArc((6.996357668, 4.180129111), (6.801772018, 4.489810399), (6.593488504, 4.790449806))
            Line((6.593488504, 4.790449806), (7.018222426, 5.099037064))
            Line((7.018222426, 5.099037064), (7.192849639, 5.736106177))
            Line((7.192849639, 5.736106177), (6.532894968, 5.707618447))
            Line((6.532894968, 5.707618447), (6.137532448, 5.362200616))
            ThreePointArc((6.137532448, 5.362200616), (5.89077814, 5.632160589), (5.632160589, 5.89077814))
            Line((5.632160589, 5.89077814), (5.99496848, 6.270245444))
            Line((5.99496848, 6.270245444), (6.053036279, 6.928257487))
            Line((6.053036279, 6.928257487), (5.408774031, 6.78238811))
            Line((5.408774031, 6.78238811), (5.081441885, 6.371926582))
            ThreePointArc((5.081441885, 6.371926582), (4.790449806, 6.593488504), (4.489810399, 6.801772018))
            Line((4.489810399, 6.801772018), (4.779031314, 7.239922976))
            Line((4.779031314, 7.239922976), (4.718673352, 7.897728901))
            Line((4.718673352, 7.897728901), (4.110810647, 7.639166239))
            Line((4.110810647, 7.639166239), (3.862029599, 7.176853585))
            ThreePointArc((3.862029599, 7.176853585), (3.536152474, 7.342896273), (3.203154008, 7.494151346))
            Line((3.203154008, 7.494151346), (3.409492149, 7.976903427))
            Line((3.409492149, 7.976903427), (3.232648382, 8.61336081))
            Line((3.232648382, 8.61336081), (2.680722426, 8.250415279))
            Line((2.680722426, 8.250415279), (2.518488504, 7.751110608))
            ThreePointArc((2.518488504, 7.751110608), (2.168200291, 7.856297315), (1.813545612, 7.945662484))
            Line((1.813545612, 7.945662484), (1.930369102, 8.457499638))
            Line((1.930369102, 8.457499638), (1.642723432, 9.052152215))
            Line((1.642723432, 9.052152215), (1.164473581, 8.596489183))
            Line((1.164473581, 8.596489183), (1.094001117, 8.076240558))
            ThreePointArc((1.094001117, 8.076240558), (0.730560368, 8.117190496), (0.365648367, 8.141793492))
        make_face()
    extrude(amount=-CUT_EXTRUDE3_DEPTH, mode=Mode.SUBTRACT)

    # Sketch8 → Cut-Extrude4 (cut)
    with BuildSketch(Plane.XY.offset(13.3).offset(CUT_EXTRUDE4_START)):
        with BuildLine():
            Line((2.045880006, -1.8), (-2.045880006, -1.8))
            ThreePointArc((-2.045880006, -1.8), (0, -2.725), (2.045880006, -1.8))
        make_face()
    extrude(amount=CUT_EXTRUDE4_DEPTH, mode=Mode.SUBTRACT)

    # Sketch9 → Boss-Extrude4 (add)
    with BuildSketch(Plane.XY.offset(13.3).offset(BOSS_EXTRUDE4_START)):
        with BuildLine():
            Line((2.045880006, 1.8), (-2.045880006, 1.8))
            ThreePointArc((-2.045880006, 1.8), (-2.725, 0), (-2.045880006, -1.8))
            Line((-2.045880006, -1.8), (2.045880006, -1.8))
            ThreePointArc((2.045880006, -1.8), (2.725, 0), (2.045880006, 1.8))
        make_face()
        Circle(SKETCH9_R, mode=Mode.SUBTRACT)
    extrude(amount=BOSS_EXTRUDE4_DEPTH)

    # Sketch10 → Boss-Extrude5 (add)
    with SkipClean():  # the faces are left unmerged after this step: merging them gives an invalid solid
        with BuildSketch(Plane(origin=(0, 0, 3), x_dir=(-1, 0, 0), z_dir=(0, 0, -1)).offset(BOSS_EXTRUDE5_START)):
            with BuildLine():
                Line((2.045880006, -1.8), (-2.045880006, -1.8))
                ThreePointArc((-2.045880006, -1.8), (0, -2.725), (2.045880006, -1.8))
            make_face()
            with BuildLine():
                Line((-2.045880006, 1.8), (2.045880006, 1.8))
                ThreePointArc((2.045880006, 1.8), (0, 2.725), (-2.045880006, 1.8))
            make_face()
        extrude(amount=-BOSS_EXTRUDE5_DEPTH)


solid = part.part
